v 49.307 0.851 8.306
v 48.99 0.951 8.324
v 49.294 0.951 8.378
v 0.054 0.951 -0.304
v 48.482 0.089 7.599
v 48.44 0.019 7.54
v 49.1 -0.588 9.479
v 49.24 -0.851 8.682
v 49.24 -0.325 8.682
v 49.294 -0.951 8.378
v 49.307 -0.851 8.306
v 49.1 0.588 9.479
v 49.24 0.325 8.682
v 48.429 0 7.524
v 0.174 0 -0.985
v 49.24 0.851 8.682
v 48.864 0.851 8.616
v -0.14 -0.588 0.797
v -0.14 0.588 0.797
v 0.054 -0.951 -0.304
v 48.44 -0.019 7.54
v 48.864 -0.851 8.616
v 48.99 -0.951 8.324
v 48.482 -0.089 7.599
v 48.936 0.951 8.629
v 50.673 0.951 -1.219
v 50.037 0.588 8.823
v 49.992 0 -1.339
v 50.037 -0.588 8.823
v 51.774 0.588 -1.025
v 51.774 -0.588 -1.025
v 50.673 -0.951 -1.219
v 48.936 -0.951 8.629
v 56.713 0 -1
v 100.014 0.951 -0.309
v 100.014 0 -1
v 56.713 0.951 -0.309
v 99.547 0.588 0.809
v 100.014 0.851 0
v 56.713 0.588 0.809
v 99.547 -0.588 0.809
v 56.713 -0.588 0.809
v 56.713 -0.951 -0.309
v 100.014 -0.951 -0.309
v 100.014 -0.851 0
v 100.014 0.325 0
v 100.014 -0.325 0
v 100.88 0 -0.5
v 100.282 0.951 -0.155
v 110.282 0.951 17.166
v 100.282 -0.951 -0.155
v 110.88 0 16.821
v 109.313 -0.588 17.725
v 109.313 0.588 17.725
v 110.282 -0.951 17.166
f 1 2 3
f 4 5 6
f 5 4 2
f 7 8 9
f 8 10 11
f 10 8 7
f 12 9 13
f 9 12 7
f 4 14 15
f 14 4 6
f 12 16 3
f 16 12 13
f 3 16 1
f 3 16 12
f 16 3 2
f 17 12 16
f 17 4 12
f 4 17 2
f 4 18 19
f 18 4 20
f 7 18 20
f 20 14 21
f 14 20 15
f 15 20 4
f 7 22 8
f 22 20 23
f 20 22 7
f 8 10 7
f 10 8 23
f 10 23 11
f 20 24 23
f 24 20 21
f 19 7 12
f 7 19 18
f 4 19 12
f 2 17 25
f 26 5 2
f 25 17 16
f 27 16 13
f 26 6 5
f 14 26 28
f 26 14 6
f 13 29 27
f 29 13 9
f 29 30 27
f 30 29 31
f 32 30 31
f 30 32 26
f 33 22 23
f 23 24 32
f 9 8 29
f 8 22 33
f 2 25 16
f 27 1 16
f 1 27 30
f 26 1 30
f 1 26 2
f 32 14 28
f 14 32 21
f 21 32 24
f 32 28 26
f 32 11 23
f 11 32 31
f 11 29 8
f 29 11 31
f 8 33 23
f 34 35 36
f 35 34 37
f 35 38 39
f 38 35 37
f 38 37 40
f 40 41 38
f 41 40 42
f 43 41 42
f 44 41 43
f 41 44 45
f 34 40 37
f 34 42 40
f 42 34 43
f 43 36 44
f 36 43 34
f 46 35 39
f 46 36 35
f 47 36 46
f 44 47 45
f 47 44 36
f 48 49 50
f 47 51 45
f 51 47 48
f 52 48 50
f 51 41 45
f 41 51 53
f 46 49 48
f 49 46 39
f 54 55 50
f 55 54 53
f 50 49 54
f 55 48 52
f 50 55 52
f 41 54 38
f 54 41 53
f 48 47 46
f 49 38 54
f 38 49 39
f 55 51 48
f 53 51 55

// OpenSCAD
phi = 10;
r = 10;
l = 50;
theta = 60;
h = 10;

rotate([0, 90-phi, 0])
cylinder(h=l);

// rotate([0, 90, 0])

translate([50 * sin(90-phi), 0, 50 * cos(90-phi)])
rotate([0, 180-phi, 0])
cylinder(h=r);


function length(r, l, theta, phi, h) =
    r > l * tan(phi) ? l * sin(theta) :
        (l * sin(theta-phi) + r * cos(theta-phi)) / sin(theta) - h * (1/tan(phi) - 1/tan(theta));

function height(r, l, theta, phi, h) =
    r > l * tan(phi) ? 0 : h;

length = length(r, l, theta, phi, h);
height = height(r, l, theta, phi, h);

translate([h / tan(phi), 0, height])
rotate([0, 90, 0])
cylinder(h=length);

translate([h / tan(phi) + length, 0, height])
rotate([0, 90-theta, 0])
cylinder(h=20);
